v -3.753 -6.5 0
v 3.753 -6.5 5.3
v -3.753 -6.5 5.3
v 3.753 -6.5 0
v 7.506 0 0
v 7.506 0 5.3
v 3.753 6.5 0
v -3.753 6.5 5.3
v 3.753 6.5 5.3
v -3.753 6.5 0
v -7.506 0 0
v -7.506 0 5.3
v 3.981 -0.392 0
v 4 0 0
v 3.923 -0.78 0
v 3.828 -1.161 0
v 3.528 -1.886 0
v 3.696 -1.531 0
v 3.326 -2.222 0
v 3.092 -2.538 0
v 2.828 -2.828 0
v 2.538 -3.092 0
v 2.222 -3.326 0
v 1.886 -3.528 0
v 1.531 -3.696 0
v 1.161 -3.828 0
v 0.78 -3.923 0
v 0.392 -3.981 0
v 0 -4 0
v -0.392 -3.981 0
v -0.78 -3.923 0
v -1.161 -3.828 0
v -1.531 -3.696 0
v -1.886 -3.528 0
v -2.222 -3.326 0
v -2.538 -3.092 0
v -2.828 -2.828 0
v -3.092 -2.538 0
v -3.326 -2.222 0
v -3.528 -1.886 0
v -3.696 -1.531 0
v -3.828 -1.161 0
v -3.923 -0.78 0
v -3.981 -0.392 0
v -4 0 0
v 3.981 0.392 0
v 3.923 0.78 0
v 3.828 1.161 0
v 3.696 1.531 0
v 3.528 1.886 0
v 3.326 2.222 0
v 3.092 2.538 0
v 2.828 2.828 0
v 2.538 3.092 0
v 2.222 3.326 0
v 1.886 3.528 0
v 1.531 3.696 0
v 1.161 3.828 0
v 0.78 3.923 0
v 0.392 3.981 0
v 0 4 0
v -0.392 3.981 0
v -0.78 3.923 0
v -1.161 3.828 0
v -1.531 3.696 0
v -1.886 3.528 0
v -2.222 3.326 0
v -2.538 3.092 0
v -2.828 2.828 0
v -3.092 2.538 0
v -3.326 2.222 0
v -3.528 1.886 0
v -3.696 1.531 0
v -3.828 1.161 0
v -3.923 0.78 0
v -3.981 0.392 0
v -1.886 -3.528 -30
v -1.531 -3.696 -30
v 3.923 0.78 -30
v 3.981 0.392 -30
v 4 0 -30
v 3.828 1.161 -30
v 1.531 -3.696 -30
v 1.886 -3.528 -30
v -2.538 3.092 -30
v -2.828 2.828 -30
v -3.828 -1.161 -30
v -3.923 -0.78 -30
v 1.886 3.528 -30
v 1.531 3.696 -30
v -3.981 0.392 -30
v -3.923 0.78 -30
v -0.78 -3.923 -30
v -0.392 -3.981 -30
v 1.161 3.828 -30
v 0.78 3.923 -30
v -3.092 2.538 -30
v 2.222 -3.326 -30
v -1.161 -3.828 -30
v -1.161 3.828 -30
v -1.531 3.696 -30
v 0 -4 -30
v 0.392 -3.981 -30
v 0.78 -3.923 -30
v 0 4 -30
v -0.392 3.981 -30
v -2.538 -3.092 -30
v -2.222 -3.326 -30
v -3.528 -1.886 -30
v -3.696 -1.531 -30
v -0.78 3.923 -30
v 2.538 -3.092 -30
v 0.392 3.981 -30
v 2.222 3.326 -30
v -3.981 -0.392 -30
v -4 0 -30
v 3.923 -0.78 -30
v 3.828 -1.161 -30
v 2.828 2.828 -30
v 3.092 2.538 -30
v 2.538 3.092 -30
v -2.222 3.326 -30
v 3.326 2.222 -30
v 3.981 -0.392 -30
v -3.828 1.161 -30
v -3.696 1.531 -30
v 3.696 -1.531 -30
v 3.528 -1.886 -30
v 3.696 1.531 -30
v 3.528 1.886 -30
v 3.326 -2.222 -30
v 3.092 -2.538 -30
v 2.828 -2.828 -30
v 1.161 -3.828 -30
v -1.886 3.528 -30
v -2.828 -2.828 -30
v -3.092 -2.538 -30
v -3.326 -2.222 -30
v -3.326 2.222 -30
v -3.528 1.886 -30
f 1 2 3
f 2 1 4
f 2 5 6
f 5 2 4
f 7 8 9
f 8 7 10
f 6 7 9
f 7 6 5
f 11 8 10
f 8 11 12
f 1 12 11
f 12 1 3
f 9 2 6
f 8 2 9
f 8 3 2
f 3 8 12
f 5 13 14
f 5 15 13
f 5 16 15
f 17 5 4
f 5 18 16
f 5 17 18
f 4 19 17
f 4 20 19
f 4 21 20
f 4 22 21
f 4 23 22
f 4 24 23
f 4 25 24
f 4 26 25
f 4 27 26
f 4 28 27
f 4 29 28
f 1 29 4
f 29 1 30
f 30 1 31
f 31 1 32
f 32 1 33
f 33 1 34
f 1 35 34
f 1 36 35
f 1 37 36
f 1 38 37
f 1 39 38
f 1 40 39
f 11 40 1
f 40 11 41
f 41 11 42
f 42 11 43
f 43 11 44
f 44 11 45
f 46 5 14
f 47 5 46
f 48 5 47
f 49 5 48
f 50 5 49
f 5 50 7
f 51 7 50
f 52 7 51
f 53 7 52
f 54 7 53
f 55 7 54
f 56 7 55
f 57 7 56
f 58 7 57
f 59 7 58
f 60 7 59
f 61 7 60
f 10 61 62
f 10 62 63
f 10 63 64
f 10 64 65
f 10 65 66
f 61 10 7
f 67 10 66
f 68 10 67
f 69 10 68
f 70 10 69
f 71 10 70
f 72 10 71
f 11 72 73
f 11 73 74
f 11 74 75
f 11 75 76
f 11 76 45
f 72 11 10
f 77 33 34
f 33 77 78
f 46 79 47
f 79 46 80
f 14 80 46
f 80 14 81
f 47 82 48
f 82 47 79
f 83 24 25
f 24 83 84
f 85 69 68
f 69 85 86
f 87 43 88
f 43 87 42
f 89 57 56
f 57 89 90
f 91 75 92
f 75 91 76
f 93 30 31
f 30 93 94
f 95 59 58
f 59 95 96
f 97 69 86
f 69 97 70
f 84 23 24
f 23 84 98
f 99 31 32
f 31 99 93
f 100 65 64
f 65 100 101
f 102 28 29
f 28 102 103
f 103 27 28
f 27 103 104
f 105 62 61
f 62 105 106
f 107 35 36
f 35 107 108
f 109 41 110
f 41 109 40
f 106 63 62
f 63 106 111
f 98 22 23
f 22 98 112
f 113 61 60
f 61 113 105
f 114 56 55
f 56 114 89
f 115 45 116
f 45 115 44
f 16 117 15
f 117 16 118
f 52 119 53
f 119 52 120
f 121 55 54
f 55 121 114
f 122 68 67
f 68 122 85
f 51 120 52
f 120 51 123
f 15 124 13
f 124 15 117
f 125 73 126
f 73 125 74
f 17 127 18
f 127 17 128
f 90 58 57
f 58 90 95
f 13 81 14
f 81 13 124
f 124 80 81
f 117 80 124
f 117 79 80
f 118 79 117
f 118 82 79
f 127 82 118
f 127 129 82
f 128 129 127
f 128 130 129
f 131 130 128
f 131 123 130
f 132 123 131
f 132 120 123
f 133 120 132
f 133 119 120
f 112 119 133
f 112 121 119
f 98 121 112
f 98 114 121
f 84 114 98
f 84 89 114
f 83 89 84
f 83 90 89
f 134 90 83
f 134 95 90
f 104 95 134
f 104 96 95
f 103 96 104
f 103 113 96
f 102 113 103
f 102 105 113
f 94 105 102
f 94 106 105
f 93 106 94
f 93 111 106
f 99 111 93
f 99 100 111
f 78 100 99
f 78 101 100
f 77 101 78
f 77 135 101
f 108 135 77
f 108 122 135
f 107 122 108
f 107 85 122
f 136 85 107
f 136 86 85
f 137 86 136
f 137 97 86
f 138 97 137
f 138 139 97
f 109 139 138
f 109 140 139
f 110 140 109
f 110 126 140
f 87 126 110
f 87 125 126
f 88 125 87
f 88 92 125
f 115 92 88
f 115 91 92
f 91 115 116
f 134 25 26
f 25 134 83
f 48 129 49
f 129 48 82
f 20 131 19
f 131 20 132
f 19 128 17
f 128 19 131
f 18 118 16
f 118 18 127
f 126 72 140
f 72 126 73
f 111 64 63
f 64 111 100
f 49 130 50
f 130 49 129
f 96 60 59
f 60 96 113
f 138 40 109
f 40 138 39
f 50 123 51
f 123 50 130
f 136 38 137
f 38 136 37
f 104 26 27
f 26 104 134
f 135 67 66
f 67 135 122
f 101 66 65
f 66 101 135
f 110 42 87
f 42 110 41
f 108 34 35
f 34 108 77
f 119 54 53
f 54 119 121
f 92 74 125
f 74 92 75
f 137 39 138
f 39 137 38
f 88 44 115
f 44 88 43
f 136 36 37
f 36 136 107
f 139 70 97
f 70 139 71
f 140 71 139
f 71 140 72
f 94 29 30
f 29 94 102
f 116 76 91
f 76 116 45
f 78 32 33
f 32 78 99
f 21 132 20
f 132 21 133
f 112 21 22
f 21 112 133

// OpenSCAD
// M8 六角ボルト(ねじ山省略・シャンクは円柱)
// 頭部: 対辺距離 13mm / 高さ 5.3mm
// 軸部: φ8mm / 長さ 30mm

$fn = 64;

AF          = 13;      // 頭部 対辺距離 (across-flats)
HEAD_H      = 5.3;     // 頭部 高さ
SHANK_D     = 8;       // 軸部 直径
SHANK_L     = 30;      // 軸部 長さ

module hex_head(af, h) {
    // 六角柱: 対辺距離 af -> 外接円半径 af/sqrt(3)
    cylinder(h = h, r = af / sqrt(3), $fn = 6);
}

module shank(d, l) {
    translate([0, 0, -l])
        cylinder(h = l, d = d);
}

module m8_hex_bolt() {
    union() {
        // 頭部: z = 0 ～ 5.3
        hex_head(AF, HEAD_H);
        // 軸部: z = -30 ～ 0
        shank(SHANK_D, SHANK_L);
    }
}

m8_hex_bolt();
